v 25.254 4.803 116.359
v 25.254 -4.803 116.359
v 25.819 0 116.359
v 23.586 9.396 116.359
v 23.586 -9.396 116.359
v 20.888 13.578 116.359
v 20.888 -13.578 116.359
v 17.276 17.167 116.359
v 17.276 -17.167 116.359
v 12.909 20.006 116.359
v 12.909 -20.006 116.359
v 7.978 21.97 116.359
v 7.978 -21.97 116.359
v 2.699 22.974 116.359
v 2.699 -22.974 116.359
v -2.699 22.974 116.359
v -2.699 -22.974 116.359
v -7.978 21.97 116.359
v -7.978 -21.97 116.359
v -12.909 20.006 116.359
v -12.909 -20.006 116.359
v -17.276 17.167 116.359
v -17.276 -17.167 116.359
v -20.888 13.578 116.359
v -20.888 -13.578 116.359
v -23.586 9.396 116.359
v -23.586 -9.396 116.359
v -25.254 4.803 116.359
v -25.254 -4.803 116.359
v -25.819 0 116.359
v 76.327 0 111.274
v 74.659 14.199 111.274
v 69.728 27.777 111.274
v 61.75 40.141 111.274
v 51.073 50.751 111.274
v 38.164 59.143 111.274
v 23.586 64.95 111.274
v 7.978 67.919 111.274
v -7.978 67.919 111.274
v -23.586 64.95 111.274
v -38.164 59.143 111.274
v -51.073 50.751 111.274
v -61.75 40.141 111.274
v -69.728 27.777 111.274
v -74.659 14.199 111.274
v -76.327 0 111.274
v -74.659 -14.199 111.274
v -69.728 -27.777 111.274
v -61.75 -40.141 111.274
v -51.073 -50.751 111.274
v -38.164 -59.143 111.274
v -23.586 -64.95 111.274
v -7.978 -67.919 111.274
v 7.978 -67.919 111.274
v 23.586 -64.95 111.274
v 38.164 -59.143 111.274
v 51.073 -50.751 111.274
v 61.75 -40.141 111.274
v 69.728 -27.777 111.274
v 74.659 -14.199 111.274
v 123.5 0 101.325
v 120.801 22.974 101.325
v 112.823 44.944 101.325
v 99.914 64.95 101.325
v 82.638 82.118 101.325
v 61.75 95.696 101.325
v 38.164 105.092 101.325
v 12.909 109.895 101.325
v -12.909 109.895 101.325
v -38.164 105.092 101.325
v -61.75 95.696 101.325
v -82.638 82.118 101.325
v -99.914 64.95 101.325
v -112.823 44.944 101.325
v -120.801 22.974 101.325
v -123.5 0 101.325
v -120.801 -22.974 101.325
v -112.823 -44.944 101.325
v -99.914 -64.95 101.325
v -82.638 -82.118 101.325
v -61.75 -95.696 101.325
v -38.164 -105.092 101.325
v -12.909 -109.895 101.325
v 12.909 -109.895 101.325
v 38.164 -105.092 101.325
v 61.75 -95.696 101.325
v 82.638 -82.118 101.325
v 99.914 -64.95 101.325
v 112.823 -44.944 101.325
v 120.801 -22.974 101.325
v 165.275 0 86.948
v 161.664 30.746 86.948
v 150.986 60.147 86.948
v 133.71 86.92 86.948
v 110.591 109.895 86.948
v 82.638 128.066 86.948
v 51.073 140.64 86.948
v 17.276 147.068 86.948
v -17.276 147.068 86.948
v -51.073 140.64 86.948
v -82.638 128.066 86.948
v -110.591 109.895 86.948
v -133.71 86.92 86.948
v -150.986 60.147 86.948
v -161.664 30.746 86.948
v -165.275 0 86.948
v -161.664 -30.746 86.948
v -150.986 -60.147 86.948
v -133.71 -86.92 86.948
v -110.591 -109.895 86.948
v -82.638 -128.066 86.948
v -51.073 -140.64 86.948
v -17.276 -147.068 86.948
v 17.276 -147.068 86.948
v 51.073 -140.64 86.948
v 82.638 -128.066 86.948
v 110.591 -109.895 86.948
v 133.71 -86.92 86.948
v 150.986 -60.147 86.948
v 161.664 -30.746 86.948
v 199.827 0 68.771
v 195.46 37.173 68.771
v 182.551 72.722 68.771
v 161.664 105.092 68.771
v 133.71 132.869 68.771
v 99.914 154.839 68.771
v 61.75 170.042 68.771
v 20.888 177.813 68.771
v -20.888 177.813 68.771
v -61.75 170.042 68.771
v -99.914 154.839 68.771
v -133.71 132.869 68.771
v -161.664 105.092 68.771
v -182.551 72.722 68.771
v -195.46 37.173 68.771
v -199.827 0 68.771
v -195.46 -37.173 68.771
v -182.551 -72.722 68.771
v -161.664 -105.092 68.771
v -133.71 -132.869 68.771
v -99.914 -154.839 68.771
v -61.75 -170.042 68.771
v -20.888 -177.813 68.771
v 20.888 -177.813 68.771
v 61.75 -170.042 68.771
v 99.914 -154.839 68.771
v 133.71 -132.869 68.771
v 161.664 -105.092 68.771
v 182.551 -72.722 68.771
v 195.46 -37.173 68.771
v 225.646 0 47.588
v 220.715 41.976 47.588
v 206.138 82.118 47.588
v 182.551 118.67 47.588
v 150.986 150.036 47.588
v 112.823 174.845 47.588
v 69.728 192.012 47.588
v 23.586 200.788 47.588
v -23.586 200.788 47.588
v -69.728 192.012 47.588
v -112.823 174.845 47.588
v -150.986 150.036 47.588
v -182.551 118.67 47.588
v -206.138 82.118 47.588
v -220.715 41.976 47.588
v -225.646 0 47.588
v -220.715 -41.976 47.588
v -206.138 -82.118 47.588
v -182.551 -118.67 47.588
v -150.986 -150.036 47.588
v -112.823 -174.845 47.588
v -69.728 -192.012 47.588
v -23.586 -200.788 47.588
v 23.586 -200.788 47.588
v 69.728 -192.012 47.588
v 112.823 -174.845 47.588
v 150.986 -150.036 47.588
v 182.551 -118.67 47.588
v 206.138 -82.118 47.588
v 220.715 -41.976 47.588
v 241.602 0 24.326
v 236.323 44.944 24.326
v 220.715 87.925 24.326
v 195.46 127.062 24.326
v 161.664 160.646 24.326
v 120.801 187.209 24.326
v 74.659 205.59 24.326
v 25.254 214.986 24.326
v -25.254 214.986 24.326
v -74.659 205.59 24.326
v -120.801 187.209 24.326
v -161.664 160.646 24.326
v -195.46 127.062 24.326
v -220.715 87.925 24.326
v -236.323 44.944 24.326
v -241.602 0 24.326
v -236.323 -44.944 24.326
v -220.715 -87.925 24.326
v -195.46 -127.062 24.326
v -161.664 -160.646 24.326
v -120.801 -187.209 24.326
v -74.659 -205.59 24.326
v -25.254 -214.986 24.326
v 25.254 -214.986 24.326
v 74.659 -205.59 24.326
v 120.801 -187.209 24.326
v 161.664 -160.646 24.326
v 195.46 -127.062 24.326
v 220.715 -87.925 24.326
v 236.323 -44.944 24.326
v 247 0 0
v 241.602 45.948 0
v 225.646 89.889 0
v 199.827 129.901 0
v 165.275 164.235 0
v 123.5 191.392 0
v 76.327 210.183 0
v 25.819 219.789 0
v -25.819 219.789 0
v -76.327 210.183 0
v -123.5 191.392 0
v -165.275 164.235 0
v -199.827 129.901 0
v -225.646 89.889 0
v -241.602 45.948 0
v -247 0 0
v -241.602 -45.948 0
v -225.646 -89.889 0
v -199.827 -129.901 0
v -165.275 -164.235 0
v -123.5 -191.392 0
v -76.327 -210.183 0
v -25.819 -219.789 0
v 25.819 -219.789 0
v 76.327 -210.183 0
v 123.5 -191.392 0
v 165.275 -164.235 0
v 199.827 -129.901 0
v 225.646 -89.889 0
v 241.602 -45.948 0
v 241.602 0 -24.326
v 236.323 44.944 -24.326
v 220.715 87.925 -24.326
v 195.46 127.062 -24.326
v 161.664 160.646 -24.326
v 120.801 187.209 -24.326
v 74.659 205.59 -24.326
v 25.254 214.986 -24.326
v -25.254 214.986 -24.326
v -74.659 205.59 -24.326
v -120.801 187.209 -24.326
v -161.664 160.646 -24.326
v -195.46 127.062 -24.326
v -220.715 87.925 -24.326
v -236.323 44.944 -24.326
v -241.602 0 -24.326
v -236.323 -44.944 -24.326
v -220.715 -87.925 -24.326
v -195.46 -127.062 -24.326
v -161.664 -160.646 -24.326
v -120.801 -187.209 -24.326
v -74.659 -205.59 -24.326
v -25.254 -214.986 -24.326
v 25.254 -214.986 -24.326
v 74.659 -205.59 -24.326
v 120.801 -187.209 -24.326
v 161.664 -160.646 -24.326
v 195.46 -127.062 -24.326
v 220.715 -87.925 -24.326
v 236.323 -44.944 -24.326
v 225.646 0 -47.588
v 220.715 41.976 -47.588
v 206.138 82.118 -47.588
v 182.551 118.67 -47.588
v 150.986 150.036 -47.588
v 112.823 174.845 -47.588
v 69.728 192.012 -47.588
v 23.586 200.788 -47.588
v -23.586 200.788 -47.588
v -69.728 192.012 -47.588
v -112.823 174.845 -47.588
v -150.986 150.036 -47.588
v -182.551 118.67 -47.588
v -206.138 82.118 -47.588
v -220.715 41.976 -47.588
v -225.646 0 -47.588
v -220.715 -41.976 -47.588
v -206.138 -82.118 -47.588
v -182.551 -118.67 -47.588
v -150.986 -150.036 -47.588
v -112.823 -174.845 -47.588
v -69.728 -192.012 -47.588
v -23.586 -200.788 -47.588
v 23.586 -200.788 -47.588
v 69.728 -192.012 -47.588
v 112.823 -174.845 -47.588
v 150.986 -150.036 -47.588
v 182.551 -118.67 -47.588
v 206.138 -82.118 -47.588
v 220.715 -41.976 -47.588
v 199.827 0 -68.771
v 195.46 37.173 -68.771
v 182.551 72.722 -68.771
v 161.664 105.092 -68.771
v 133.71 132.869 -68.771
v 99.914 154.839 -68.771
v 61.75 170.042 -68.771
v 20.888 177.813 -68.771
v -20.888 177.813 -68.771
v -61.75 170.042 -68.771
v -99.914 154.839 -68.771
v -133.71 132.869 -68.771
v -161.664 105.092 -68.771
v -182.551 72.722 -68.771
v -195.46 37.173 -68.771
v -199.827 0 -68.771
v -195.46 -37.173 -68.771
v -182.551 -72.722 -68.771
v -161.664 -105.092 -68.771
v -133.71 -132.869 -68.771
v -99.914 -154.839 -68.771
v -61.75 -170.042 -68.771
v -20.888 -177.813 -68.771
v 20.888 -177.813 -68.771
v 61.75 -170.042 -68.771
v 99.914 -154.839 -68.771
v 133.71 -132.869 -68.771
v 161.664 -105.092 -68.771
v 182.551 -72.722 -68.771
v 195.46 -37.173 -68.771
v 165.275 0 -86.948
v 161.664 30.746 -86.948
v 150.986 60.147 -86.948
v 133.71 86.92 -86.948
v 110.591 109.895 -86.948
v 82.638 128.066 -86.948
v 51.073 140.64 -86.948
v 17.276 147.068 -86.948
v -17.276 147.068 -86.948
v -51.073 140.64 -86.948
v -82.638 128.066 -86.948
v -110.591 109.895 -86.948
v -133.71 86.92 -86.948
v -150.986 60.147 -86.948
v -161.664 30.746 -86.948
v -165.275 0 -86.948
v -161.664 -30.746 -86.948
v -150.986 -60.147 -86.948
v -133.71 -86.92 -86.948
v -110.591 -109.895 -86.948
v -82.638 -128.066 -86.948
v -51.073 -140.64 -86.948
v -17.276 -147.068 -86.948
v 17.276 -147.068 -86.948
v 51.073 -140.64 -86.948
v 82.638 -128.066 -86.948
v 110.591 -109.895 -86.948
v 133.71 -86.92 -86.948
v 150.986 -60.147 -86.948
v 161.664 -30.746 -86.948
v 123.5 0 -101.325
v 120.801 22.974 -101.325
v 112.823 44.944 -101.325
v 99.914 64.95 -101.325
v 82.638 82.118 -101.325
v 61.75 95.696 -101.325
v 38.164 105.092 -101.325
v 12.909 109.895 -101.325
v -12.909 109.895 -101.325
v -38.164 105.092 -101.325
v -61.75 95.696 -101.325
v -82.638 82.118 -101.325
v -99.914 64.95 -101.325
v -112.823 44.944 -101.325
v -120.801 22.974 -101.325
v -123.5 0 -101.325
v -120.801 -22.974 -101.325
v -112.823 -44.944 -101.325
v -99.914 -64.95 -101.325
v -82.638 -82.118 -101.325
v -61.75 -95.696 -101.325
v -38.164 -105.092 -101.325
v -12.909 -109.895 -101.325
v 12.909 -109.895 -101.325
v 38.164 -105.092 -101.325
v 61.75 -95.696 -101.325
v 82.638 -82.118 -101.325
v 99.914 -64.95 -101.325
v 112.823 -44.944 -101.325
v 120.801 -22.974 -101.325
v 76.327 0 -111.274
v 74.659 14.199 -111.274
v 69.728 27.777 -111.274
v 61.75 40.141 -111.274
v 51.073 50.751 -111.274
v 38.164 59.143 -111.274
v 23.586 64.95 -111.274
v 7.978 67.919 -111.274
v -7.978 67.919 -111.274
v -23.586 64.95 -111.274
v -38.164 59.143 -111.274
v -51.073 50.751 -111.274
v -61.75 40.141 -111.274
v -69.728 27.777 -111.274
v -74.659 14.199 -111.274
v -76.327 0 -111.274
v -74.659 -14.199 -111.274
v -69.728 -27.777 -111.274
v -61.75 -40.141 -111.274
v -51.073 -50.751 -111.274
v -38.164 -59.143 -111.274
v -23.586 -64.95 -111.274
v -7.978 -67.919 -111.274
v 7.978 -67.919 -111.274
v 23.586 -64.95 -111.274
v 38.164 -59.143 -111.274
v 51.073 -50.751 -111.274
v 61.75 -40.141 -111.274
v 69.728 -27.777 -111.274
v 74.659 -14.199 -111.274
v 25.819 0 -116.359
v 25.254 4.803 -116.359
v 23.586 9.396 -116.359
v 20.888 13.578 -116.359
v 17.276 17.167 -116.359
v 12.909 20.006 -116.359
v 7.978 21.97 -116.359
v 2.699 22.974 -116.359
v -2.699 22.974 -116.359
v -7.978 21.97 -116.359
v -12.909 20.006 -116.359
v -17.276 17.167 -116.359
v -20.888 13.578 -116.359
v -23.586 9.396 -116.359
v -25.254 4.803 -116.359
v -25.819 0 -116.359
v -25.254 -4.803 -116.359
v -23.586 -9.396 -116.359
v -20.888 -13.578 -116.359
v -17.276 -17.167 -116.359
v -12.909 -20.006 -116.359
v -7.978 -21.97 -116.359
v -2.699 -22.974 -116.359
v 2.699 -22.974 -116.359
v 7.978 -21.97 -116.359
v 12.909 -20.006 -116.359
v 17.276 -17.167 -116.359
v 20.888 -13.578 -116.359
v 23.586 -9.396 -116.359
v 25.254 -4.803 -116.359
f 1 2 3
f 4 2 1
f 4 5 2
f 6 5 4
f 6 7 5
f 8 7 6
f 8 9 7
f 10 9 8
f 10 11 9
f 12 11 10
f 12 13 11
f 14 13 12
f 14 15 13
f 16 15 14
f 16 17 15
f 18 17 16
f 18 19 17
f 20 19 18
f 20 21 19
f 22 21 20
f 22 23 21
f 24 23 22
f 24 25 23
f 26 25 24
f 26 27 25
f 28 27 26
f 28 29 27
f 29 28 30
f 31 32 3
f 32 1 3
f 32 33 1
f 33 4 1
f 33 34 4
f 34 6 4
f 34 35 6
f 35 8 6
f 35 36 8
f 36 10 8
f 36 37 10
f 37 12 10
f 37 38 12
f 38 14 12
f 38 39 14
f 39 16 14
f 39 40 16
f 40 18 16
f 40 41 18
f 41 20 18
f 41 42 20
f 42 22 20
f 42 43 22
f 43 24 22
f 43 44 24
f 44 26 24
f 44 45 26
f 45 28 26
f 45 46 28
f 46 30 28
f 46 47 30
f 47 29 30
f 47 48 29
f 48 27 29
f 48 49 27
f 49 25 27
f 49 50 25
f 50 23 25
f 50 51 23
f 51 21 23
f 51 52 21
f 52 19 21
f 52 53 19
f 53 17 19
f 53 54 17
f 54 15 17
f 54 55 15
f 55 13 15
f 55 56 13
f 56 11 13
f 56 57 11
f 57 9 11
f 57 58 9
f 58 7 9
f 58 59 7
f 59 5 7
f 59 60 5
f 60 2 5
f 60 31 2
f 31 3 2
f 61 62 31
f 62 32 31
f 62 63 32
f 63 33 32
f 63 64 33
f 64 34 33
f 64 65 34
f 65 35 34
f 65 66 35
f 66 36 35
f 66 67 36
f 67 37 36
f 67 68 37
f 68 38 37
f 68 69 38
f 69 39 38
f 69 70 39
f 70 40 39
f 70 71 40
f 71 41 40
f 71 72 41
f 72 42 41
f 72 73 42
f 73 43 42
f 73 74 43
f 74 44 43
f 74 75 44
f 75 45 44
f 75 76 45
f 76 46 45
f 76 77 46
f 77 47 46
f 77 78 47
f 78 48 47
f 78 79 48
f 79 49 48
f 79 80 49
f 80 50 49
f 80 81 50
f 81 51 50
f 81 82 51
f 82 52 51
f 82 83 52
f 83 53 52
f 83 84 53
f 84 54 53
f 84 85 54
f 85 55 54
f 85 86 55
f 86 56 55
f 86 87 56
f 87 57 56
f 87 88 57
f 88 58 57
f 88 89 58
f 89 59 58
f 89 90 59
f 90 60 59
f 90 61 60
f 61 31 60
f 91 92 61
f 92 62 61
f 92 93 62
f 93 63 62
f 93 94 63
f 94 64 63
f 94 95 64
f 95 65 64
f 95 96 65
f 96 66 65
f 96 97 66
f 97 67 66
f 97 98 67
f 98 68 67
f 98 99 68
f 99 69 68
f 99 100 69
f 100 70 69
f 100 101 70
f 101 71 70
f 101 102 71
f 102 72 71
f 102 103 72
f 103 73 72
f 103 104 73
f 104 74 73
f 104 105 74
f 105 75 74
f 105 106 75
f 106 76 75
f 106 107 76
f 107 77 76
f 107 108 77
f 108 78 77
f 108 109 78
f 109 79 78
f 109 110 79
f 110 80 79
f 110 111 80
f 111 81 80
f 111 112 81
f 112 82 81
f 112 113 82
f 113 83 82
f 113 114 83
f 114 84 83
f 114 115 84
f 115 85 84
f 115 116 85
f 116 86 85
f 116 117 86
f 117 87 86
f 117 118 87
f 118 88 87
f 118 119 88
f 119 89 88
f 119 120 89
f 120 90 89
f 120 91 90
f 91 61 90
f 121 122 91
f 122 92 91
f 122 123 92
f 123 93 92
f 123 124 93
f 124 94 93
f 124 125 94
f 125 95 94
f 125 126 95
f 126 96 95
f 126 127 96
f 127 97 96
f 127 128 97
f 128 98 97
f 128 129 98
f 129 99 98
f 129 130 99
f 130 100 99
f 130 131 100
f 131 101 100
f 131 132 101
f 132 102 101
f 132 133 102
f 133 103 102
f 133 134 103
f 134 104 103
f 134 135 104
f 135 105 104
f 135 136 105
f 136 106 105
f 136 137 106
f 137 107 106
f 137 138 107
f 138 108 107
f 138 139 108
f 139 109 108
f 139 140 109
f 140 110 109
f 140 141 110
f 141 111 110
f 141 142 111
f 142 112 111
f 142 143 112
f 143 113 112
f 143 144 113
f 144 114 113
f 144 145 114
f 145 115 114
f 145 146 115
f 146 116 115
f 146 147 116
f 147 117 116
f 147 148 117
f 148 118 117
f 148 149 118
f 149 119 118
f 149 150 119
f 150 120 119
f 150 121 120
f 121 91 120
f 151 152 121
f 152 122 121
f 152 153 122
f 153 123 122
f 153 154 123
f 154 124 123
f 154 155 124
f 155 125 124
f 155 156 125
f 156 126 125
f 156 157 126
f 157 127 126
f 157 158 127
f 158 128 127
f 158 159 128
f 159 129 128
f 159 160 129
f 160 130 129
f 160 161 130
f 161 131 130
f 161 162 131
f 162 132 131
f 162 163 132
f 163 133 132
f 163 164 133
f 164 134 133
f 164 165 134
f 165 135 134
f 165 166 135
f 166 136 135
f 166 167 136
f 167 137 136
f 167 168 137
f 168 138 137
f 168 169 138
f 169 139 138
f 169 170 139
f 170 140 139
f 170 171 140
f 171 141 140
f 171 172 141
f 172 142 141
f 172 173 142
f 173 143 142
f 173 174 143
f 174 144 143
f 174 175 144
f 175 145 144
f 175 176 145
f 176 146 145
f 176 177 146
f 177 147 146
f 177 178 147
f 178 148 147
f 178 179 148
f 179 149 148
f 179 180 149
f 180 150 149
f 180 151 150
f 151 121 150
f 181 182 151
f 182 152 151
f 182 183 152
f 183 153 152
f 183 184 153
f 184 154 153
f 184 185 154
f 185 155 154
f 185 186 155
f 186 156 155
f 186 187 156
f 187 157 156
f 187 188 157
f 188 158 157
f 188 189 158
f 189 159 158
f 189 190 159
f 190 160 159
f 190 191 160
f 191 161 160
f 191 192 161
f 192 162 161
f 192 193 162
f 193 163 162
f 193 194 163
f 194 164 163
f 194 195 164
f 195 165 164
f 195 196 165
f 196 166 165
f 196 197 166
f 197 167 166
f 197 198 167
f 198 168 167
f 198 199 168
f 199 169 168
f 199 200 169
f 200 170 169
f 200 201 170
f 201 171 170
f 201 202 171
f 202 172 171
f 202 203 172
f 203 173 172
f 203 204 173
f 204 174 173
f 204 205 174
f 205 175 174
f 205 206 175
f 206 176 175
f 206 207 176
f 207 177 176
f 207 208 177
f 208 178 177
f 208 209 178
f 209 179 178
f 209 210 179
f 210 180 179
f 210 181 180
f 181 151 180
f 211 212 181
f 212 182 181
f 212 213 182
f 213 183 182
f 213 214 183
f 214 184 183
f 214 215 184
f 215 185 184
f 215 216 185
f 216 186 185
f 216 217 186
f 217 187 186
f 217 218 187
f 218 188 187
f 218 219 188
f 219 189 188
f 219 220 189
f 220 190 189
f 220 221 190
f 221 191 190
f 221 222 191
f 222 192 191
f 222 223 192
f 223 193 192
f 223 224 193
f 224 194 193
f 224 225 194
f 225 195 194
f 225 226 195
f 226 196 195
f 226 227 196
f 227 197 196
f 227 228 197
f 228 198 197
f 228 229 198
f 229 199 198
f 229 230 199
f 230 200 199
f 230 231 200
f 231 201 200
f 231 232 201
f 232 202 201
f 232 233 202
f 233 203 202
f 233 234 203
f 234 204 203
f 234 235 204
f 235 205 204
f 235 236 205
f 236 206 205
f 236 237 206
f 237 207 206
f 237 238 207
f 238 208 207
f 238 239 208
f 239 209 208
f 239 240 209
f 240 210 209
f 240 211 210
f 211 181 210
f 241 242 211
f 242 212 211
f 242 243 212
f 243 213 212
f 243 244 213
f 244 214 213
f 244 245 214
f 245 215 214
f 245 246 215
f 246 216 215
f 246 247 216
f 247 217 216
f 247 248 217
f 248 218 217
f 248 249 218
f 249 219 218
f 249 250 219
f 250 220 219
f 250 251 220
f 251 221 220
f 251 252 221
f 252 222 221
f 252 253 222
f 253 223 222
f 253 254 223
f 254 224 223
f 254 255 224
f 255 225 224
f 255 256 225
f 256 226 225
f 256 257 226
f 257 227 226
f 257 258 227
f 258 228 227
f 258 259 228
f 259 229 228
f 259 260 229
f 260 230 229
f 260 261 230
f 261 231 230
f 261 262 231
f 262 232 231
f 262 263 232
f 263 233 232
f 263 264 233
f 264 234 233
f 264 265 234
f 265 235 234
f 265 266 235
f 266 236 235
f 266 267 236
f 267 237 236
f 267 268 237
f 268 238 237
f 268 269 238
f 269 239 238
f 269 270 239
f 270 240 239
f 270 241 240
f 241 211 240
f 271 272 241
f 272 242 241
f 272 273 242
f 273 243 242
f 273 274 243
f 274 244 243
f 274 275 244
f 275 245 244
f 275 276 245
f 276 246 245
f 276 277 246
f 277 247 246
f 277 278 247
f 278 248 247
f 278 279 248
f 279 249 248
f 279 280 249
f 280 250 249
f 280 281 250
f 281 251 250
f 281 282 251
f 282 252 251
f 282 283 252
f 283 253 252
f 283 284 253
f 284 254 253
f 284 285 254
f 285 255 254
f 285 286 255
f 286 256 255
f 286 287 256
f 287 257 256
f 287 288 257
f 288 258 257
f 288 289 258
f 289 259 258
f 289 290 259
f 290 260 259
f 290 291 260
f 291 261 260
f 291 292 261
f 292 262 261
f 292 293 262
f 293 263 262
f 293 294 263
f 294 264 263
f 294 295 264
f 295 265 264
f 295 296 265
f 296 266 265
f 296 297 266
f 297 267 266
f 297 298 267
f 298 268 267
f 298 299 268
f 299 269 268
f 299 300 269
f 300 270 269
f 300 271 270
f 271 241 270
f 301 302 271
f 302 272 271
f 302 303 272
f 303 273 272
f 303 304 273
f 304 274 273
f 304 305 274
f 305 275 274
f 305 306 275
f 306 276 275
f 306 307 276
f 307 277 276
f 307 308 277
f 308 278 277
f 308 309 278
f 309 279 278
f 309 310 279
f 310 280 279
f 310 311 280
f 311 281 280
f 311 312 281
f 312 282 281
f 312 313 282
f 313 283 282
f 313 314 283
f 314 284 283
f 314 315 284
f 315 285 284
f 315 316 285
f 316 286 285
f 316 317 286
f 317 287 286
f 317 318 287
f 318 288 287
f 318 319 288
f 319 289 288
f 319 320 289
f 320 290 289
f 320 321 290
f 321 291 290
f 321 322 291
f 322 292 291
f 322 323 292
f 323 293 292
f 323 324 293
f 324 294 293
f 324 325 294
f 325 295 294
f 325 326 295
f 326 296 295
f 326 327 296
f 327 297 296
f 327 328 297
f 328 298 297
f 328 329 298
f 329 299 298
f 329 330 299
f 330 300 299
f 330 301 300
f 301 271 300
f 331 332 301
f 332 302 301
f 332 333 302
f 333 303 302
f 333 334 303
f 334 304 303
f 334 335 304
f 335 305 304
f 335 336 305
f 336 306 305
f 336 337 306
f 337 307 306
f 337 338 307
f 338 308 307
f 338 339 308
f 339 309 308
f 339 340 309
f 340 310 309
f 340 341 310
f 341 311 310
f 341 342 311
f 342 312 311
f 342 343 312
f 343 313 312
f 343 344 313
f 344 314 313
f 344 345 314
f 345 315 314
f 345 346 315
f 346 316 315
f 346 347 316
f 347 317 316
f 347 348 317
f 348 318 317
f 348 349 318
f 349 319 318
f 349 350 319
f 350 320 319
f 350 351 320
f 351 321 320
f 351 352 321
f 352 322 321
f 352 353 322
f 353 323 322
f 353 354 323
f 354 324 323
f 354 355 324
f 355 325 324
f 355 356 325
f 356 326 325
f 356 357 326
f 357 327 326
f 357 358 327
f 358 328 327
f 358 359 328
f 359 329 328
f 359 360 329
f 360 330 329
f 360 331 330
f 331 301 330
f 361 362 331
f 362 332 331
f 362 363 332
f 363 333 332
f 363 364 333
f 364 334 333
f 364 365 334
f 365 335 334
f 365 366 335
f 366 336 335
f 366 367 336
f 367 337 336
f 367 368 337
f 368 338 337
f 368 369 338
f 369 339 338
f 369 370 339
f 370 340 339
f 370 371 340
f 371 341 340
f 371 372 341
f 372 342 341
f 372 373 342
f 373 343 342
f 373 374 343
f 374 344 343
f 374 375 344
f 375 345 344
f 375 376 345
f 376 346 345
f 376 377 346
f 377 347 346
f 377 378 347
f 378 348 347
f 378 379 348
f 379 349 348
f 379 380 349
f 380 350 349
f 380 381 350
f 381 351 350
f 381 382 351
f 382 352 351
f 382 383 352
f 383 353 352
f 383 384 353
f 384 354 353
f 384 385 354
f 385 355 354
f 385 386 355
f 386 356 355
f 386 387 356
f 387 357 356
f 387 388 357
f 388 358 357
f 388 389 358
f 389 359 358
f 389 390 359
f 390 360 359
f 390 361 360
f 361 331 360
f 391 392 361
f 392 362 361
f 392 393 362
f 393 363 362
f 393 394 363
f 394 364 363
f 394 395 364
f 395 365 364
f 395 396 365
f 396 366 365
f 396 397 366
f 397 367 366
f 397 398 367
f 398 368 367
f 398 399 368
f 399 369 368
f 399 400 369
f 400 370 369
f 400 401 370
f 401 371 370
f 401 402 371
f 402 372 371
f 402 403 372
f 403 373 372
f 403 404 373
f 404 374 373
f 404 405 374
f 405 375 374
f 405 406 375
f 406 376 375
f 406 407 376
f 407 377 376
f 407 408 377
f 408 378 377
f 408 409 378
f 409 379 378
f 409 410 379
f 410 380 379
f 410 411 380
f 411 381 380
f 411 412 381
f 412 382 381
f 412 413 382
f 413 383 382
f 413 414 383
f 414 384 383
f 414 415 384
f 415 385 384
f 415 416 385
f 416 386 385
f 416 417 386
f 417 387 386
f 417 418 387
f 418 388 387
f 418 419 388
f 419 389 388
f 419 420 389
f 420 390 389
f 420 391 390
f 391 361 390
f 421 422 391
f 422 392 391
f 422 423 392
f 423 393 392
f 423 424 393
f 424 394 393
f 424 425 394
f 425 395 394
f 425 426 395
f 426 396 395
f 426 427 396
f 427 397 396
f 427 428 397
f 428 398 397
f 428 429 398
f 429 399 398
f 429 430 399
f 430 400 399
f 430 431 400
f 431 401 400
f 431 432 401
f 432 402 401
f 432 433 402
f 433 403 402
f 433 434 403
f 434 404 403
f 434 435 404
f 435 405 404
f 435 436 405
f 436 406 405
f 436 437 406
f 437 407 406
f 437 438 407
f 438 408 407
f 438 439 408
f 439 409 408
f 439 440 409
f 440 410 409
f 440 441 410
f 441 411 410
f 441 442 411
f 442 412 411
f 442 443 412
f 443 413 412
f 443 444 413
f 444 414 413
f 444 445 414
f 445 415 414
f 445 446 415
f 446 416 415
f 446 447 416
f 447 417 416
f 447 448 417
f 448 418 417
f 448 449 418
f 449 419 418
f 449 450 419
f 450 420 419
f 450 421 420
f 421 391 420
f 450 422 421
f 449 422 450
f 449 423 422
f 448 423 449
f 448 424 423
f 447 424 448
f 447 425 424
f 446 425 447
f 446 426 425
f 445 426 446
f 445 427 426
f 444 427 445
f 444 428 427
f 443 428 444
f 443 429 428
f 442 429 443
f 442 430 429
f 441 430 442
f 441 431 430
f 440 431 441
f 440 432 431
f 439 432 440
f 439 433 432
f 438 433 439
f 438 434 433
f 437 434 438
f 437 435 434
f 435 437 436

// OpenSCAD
// Generated by SolidPython 1.0.1 on 2020-07-29 00:46:54


scale(v = [19, 17, 9]) {
	sphere(r = 13);
}
/***********************************************
*********      SolidPython code:      **********
************************************************
 
# import packages: SolidPython
from solid import *
from solid.utils import *
from itertools import chain, combinations, permutations


class Resize:

    def __init__(self, scad_file):
        self.scad_file = scad_file
        #self.scad_file = import_scad(scad_file)
        # cone/cylinder param:
        self.r1 = 0
        self.r2 = 0
        self.h = 0
        # rectangular prism param:
        self.w = 0
        self.l = 0
        # ellipse param:
        self.r = 0

    # import OpenScad code (file name corresponds to shape)


    # classify shape + parameters
    def assign(self, param1, param2, param3):
        if self.scad_file == 'cone.scad':
            self.r1 = param1
            self.r2 = param2
            self.h = param3
        elif self.scad_file == 'cylinder.scad':
            self.r1 = param1
            self.r2 = param2
            self.h = param3
        elif self.scad_file == 'rectangularPrism.scad':
            self.h = param1
            self.l = param2
            self.w = param3
        else:
            self.r = param1
            self.h = param2

    # resize parameters
    def iterate(self):
        x = range(3, 20, 2)
        i = 1
        if self.scad_file == 'cone.scad':
            tempList = list(permutations(x, 2))
            for temp in tempList:
                param1 = temp[0]
                param2 = temp[1]
                filepath = 'produced_scad_files/' + 'cone' + str(param1) + '_' + str(param2) + '_' + '.scad'
                scad_render_to_file(cylinder(h=param1, r1=param2, r2=0), filepath)

        elif self.scad_file == 'cylinder.scad':
            tempList = list(permutations(x, 3))
            for temp in tempList:
                param1 = temp[0]
                param2 = temp[1]
                filepath = 'produced_scad_files/' + 'cylinder' + str(param1) + '_' + str(param2) + '_' + '.scad'
                scad_render_to_file(cylinder(h=param1, r1=param2, r2=param2), filepath)

        elif self.scad_file == 'rectangularPrism.scad':
            tempList = list(permutations(x, 3))
            for temp in tempList:
                param1 = temp[0]
                param2 = temp[1]
                param3 = temp[2]
                filepath = 'produced_scad_files/' + 'rectangularPrism' + str(param1) + '_' + str(param2) + '_' + str(
                    param3) + '.scad'
                scad_render_to_file(cube(size=(param1, param2, param3)), filepath)

        elif self.scad_file == 'ellipse.scad':
            tempList = list(permutations(x, 4))
            for temp in tempList:
                param1 = temp[0]
                param2 = temp[1]
                param3 = temp[2]
                param4 = temp[3]
                filepath = 'produced_scad_files/' + 'ellipse' + str(param1) + '_' + str(param2) + '_' + str(param3) + '_' + str(param4) + '.scad'
                scad_render_to_file(scale([param1, param2, param3])(sphere(r=param4)), filepath)

    def render_to_scadfile(self):
        scad_render_to_file(scad, 'example.scad') 
 
************************************************/
